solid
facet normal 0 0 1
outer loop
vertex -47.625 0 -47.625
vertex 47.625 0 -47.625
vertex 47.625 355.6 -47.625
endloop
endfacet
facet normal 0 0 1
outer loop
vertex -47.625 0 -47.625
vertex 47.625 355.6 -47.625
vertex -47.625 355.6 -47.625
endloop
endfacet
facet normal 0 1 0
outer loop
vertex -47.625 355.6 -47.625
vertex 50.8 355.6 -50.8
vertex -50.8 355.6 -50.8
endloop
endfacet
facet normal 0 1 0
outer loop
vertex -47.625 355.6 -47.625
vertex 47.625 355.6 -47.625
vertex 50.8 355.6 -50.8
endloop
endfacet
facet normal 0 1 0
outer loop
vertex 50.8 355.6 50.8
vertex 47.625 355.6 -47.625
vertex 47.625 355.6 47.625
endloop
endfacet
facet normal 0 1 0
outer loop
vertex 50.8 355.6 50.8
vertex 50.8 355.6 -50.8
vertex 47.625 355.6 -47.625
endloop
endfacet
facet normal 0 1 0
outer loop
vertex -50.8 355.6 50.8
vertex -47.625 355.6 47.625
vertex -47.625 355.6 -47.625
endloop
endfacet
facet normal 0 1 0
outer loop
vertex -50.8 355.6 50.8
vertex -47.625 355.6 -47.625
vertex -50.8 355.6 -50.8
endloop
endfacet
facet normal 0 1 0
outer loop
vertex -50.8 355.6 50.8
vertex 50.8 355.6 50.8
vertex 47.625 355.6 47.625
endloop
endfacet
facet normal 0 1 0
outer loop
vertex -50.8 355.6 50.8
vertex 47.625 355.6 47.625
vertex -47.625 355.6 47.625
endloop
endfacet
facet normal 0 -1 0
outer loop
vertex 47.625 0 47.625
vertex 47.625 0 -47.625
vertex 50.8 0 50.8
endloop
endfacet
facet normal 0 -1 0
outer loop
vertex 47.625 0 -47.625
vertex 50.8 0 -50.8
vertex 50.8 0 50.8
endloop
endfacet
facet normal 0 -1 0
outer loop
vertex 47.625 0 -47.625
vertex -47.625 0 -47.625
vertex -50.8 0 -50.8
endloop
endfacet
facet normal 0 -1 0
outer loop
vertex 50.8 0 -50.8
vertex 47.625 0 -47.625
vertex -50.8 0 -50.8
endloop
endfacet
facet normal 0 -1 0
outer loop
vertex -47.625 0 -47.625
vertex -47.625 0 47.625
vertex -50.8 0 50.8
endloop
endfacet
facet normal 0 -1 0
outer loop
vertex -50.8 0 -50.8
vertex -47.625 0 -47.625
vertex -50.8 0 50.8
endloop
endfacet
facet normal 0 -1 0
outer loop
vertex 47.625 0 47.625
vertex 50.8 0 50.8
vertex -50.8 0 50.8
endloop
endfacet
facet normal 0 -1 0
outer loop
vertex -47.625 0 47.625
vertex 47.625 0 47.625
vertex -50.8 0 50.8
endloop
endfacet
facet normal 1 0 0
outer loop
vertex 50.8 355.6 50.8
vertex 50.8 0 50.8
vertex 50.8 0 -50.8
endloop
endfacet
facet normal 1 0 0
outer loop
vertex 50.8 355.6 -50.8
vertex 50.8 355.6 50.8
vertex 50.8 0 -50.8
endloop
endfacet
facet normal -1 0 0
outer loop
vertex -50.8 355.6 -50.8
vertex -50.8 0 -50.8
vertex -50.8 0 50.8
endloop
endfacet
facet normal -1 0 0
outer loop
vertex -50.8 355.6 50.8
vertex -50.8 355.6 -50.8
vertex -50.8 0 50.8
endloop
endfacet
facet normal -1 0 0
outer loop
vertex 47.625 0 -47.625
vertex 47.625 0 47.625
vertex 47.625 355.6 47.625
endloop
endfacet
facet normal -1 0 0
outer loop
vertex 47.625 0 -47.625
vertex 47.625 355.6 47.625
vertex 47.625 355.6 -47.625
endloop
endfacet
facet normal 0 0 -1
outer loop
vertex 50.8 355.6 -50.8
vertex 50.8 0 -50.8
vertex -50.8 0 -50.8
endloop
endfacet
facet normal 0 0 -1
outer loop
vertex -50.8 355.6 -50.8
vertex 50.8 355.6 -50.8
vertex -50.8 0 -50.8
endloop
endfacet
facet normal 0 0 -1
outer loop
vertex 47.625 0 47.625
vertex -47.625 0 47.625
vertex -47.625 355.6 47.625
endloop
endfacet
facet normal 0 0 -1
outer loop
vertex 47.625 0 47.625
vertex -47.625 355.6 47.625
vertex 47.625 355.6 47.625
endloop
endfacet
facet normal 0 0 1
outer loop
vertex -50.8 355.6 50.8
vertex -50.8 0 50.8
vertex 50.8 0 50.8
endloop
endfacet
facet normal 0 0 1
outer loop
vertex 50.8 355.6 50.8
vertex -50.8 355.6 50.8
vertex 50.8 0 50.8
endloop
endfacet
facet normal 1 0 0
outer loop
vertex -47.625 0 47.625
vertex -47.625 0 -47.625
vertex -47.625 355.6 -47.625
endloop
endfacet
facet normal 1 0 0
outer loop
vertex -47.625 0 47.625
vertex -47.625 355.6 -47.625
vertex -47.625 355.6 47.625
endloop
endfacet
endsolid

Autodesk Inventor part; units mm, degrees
ref_plane "YZ Plane" through (0, 0, 0) normal (1, 0, 0) x (0, 1, 0)
ref_plane "XZ Plane" through (0, 0, 0) normal (0, 1, 0) x (-1, 0, 0)
ref_plane "XY Plane" through (0, 0, 0) normal (0, 0, 1) x (1, 0, 0)
sketch "Sketch1" plane through (0, 0, 0) normal (0, 1, 0) x (-1, 0, 0)
  line L0 (-50.8, 50.8) -> (-50.8, -50.8)
  line L1 (-50.8, -50.8) -> (50.8, -50.8)
  line L2 (50.8, -50.8) -> (50.8, 50.8)
  line L3 (50.8, 50.8) -> (-50.8, 50.8)
  line L4 (-50.8, 50.8) -> (50.8, -50.8) construction
  line L5 (-50.8, -50.8) -> (50.8, 50.8) construction
  line L6 (-47.625, 47.625) -> (-47.625, -47.625)
  line L7 (-47.625, -47.625) -> (47.625, -47.625)
  line L8 (47.625, -47.625) -> (47.625, 47.625)
  line L9 (47.625, 47.625) -> (-47.625, 47.625)
  line L10 (-47.625, 47.625) -> (47.625, -47.625) construction
  line L11 (-47.625, -47.625) -> (47.625, 47.625) construction
  point P0 (0, 0)
  dimension "d0" = 101.6
  dimension "d1" = 3.175
extrude "Extrusion1" add sketch "Sketch1" along normal blind 355.6
properties part number "AlumPost-4x4xMaxLowBaript" material "Aluminum 6061"
